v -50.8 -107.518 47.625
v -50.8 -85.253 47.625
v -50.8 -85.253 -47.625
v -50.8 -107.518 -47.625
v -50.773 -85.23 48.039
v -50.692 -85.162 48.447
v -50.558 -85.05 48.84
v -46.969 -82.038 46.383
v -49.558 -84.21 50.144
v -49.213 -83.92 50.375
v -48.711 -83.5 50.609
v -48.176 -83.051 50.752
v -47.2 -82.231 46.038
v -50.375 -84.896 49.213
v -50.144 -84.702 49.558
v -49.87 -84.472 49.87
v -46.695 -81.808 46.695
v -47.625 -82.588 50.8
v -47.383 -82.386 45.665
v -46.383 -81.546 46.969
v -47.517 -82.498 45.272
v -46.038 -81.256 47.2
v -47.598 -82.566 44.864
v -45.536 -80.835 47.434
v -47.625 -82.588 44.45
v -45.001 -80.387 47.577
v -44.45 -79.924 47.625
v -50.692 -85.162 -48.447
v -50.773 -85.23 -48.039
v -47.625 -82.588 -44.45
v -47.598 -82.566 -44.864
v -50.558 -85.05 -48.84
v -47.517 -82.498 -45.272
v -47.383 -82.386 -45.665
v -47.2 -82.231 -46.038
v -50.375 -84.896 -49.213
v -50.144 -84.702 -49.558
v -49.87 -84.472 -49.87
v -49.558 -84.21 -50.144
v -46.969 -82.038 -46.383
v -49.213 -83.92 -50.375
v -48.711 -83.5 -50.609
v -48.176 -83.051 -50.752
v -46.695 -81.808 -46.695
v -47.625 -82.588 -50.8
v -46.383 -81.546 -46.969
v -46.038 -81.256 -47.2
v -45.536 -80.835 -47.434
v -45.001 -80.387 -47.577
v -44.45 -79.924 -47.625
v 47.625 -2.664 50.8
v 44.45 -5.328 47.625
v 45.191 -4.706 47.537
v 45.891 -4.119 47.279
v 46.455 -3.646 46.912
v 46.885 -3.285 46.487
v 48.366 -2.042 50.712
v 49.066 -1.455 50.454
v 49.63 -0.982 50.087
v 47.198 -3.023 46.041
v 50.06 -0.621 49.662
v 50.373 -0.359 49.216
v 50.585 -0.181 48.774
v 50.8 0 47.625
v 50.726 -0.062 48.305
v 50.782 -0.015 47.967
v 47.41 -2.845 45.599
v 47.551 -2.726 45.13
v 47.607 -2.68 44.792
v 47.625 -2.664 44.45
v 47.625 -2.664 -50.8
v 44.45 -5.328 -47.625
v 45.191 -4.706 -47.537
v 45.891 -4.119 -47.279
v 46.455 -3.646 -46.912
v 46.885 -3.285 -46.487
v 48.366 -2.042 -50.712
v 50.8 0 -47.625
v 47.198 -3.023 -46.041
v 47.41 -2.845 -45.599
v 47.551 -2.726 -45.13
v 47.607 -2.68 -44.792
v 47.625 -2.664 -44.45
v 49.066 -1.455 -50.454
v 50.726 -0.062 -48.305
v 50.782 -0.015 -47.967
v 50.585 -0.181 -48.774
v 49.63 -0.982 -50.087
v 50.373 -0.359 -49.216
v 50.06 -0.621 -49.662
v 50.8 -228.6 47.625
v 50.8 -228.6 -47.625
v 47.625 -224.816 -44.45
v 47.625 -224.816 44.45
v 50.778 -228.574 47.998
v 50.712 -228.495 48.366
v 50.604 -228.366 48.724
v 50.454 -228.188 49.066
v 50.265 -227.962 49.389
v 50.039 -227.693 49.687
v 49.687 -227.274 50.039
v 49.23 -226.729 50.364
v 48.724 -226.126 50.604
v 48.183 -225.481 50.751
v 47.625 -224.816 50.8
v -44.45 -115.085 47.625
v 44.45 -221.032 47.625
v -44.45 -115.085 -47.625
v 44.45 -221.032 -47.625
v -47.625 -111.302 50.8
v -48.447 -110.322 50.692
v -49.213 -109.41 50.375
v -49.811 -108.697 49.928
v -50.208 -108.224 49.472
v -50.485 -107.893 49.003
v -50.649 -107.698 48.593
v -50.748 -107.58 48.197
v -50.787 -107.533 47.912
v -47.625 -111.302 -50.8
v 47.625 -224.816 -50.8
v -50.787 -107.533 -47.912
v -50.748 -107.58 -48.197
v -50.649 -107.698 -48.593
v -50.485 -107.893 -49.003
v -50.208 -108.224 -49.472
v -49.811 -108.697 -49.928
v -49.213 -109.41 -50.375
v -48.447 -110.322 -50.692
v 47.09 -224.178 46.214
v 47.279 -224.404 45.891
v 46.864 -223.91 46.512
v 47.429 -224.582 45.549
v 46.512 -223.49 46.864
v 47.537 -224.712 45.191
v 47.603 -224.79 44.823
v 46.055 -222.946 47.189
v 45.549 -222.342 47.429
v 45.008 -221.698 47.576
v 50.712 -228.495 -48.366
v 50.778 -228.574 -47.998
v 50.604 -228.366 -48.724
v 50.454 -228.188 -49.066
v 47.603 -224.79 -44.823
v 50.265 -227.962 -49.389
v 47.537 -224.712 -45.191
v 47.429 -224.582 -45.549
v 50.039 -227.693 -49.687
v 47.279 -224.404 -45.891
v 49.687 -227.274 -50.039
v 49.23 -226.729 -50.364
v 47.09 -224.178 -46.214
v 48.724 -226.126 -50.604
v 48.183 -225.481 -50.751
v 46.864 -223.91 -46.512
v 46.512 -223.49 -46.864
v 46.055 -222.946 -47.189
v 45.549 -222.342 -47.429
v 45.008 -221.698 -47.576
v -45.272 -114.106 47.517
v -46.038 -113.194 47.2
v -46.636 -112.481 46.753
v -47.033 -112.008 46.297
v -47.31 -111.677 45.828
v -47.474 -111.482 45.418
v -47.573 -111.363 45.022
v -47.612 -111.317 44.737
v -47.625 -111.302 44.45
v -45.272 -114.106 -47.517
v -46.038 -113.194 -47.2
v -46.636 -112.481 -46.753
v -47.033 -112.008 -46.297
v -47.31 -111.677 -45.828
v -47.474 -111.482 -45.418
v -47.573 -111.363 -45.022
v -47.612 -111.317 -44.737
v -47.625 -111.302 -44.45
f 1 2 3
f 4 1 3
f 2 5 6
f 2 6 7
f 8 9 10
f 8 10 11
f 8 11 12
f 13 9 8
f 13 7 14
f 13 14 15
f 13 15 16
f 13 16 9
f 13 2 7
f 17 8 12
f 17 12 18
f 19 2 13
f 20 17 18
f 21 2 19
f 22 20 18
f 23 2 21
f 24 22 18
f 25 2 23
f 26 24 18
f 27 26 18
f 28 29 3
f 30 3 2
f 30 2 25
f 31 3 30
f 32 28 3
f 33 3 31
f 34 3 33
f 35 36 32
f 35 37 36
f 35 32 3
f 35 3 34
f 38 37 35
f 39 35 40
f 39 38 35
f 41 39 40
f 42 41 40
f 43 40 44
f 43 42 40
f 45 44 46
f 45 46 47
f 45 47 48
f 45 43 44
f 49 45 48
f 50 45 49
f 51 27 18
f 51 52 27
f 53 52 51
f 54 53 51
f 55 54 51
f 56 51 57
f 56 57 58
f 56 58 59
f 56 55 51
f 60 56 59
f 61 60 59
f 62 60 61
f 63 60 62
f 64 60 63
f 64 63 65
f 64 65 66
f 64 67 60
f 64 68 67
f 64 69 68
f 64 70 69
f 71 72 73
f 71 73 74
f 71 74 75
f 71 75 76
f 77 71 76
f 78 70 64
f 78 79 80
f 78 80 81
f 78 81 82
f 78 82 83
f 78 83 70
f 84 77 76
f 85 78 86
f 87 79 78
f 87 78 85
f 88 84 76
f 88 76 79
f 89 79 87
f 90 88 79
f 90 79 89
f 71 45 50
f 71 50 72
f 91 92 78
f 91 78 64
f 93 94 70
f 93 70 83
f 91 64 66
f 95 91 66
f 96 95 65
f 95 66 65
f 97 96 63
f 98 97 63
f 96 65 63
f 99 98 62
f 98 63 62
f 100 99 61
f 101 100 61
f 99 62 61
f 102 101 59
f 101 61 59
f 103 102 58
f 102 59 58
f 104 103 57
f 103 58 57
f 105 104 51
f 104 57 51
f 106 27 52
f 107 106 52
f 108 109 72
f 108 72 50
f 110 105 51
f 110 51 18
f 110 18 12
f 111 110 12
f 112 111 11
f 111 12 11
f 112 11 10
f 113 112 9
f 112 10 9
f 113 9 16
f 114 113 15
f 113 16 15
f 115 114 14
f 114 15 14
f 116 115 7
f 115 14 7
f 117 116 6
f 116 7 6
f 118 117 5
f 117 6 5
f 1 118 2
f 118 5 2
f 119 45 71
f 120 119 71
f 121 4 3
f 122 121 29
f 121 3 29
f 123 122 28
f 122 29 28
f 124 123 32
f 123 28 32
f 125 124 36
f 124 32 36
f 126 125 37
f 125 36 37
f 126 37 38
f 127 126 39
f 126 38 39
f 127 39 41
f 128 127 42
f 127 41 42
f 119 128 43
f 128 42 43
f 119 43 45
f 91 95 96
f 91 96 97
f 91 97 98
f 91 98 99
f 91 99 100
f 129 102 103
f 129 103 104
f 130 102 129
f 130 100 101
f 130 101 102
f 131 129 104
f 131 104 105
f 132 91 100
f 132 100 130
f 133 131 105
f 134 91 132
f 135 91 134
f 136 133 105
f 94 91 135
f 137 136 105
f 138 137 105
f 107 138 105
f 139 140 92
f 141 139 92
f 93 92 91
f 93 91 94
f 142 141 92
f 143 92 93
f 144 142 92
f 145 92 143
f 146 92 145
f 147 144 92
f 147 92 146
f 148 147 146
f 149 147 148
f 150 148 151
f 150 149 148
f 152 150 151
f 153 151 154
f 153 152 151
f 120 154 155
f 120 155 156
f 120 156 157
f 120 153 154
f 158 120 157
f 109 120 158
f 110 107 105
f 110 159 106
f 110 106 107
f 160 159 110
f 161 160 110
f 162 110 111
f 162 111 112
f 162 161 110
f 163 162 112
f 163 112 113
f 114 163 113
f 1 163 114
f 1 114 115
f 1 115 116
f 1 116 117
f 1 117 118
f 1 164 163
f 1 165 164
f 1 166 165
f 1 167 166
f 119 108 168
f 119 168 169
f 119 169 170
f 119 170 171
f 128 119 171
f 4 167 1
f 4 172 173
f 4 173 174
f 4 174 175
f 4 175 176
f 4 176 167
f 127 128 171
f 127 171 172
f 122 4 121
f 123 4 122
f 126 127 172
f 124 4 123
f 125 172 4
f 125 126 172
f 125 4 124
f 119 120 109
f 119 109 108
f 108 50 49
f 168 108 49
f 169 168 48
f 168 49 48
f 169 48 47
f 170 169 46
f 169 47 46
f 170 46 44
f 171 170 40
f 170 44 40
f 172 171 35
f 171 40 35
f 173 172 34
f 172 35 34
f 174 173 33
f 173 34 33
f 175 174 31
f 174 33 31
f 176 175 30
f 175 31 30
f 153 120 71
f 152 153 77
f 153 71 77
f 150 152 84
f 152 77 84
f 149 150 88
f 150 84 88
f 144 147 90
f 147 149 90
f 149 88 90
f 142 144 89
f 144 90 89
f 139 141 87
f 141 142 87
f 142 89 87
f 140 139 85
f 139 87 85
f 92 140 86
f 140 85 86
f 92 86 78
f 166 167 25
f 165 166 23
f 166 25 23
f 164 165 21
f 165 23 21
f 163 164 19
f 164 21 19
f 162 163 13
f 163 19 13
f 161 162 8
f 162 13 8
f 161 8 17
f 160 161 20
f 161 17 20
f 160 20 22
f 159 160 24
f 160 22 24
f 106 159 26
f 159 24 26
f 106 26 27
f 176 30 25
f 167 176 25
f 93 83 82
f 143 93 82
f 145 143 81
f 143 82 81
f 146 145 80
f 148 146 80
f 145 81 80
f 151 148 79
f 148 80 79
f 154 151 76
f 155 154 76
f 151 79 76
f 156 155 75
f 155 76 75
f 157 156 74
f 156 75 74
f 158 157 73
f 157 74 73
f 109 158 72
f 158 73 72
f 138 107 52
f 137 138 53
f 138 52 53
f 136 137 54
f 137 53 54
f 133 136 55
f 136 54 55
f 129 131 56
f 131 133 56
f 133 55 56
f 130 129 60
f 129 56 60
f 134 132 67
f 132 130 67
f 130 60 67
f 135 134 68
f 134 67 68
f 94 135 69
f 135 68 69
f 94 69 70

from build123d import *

# Parameters (mm, degrees)
F1_DEPTH      = 228.6
F3_DEPTH      = 50.801
F3_DEPTH_BACK = 50.801


with BuildPart() as f1:
    # F0 (on Front) → F1 (new body)
    with BuildSketch(Plane.XZ):
        with BuildLine():
            ThreePointArc((50.8, 47.625), (49.8700640303, 49.8700640303), (47.625, 50.8))
            Line((47.625, 50.8), (-47.625, 50.8))
            ThreePointArc((-47.625, 50.8), (-49.8700640303, 49.8700640303), (-50.8, 47.625))
            Line((-50.8, 47.625), (-50.8, -47.625))
            ThreePointArc((-50.8, -47.625), (-49.8700640303, -49.8700640303), (-47.625, -50.8))
            Line((-47.625, -50.8), (47.625, -50.8))
            ThreePointArc((47.625, -50.8), (49.8700640303, -49.8700640303), (50.8, -47.625))
            Line((50.8, -47.625), (50.8, 47.625))
        make_face()
        with BuildLine():
            Line((-44.45, 47.625), (44.45, 47.625))
            ThreePointArc((44.45, 47.625), (46.6950640303, 46.6950640303), (47.625, 44.45))
            Line((47.625, 44.45), (47.625, -44.45))
            ThreePointArc((47.625, -44.45), (46.6950640303, -46.6950640303), (44.45, -47.625))
            Line((44.45, -47.625), (-44.45, -47.625))
            ThreePointArc((-44.45, -47.625), (-46.6950640303, -46.6950640303), (-47.625, -44.45))
            Line((-47.625, -44.45), (-47.625, 44.45))
            ThreePointArc((-47.625, 44.45), (-46.6950640303, 46.6950640303), (-44.45, 47.625))
        make_face(mode=Mode.SUBTRACT)
    extrude(amount=F1_DEPTH)

    # F2 (on Top) → F3 (cut, two sides)
    with BuildSketch(Plane.XY) as f3_sk:
        Polygon((50.8, 0), (-50.8, 0), (-50.8, -85.2525225276), align=None)
        Polygon((-50.8, -107.5178349924), (-50.8, -228.6), (50.8, -228.6), align=None)
    extrude(amount=-F3_DEPTH, mode=Mode.SUBTRACT)
    extrude(f3_sk.sketch, amount=F3_DEPTH_BACK, mode=Mode.SUBTRACT)


solid = f1.part
